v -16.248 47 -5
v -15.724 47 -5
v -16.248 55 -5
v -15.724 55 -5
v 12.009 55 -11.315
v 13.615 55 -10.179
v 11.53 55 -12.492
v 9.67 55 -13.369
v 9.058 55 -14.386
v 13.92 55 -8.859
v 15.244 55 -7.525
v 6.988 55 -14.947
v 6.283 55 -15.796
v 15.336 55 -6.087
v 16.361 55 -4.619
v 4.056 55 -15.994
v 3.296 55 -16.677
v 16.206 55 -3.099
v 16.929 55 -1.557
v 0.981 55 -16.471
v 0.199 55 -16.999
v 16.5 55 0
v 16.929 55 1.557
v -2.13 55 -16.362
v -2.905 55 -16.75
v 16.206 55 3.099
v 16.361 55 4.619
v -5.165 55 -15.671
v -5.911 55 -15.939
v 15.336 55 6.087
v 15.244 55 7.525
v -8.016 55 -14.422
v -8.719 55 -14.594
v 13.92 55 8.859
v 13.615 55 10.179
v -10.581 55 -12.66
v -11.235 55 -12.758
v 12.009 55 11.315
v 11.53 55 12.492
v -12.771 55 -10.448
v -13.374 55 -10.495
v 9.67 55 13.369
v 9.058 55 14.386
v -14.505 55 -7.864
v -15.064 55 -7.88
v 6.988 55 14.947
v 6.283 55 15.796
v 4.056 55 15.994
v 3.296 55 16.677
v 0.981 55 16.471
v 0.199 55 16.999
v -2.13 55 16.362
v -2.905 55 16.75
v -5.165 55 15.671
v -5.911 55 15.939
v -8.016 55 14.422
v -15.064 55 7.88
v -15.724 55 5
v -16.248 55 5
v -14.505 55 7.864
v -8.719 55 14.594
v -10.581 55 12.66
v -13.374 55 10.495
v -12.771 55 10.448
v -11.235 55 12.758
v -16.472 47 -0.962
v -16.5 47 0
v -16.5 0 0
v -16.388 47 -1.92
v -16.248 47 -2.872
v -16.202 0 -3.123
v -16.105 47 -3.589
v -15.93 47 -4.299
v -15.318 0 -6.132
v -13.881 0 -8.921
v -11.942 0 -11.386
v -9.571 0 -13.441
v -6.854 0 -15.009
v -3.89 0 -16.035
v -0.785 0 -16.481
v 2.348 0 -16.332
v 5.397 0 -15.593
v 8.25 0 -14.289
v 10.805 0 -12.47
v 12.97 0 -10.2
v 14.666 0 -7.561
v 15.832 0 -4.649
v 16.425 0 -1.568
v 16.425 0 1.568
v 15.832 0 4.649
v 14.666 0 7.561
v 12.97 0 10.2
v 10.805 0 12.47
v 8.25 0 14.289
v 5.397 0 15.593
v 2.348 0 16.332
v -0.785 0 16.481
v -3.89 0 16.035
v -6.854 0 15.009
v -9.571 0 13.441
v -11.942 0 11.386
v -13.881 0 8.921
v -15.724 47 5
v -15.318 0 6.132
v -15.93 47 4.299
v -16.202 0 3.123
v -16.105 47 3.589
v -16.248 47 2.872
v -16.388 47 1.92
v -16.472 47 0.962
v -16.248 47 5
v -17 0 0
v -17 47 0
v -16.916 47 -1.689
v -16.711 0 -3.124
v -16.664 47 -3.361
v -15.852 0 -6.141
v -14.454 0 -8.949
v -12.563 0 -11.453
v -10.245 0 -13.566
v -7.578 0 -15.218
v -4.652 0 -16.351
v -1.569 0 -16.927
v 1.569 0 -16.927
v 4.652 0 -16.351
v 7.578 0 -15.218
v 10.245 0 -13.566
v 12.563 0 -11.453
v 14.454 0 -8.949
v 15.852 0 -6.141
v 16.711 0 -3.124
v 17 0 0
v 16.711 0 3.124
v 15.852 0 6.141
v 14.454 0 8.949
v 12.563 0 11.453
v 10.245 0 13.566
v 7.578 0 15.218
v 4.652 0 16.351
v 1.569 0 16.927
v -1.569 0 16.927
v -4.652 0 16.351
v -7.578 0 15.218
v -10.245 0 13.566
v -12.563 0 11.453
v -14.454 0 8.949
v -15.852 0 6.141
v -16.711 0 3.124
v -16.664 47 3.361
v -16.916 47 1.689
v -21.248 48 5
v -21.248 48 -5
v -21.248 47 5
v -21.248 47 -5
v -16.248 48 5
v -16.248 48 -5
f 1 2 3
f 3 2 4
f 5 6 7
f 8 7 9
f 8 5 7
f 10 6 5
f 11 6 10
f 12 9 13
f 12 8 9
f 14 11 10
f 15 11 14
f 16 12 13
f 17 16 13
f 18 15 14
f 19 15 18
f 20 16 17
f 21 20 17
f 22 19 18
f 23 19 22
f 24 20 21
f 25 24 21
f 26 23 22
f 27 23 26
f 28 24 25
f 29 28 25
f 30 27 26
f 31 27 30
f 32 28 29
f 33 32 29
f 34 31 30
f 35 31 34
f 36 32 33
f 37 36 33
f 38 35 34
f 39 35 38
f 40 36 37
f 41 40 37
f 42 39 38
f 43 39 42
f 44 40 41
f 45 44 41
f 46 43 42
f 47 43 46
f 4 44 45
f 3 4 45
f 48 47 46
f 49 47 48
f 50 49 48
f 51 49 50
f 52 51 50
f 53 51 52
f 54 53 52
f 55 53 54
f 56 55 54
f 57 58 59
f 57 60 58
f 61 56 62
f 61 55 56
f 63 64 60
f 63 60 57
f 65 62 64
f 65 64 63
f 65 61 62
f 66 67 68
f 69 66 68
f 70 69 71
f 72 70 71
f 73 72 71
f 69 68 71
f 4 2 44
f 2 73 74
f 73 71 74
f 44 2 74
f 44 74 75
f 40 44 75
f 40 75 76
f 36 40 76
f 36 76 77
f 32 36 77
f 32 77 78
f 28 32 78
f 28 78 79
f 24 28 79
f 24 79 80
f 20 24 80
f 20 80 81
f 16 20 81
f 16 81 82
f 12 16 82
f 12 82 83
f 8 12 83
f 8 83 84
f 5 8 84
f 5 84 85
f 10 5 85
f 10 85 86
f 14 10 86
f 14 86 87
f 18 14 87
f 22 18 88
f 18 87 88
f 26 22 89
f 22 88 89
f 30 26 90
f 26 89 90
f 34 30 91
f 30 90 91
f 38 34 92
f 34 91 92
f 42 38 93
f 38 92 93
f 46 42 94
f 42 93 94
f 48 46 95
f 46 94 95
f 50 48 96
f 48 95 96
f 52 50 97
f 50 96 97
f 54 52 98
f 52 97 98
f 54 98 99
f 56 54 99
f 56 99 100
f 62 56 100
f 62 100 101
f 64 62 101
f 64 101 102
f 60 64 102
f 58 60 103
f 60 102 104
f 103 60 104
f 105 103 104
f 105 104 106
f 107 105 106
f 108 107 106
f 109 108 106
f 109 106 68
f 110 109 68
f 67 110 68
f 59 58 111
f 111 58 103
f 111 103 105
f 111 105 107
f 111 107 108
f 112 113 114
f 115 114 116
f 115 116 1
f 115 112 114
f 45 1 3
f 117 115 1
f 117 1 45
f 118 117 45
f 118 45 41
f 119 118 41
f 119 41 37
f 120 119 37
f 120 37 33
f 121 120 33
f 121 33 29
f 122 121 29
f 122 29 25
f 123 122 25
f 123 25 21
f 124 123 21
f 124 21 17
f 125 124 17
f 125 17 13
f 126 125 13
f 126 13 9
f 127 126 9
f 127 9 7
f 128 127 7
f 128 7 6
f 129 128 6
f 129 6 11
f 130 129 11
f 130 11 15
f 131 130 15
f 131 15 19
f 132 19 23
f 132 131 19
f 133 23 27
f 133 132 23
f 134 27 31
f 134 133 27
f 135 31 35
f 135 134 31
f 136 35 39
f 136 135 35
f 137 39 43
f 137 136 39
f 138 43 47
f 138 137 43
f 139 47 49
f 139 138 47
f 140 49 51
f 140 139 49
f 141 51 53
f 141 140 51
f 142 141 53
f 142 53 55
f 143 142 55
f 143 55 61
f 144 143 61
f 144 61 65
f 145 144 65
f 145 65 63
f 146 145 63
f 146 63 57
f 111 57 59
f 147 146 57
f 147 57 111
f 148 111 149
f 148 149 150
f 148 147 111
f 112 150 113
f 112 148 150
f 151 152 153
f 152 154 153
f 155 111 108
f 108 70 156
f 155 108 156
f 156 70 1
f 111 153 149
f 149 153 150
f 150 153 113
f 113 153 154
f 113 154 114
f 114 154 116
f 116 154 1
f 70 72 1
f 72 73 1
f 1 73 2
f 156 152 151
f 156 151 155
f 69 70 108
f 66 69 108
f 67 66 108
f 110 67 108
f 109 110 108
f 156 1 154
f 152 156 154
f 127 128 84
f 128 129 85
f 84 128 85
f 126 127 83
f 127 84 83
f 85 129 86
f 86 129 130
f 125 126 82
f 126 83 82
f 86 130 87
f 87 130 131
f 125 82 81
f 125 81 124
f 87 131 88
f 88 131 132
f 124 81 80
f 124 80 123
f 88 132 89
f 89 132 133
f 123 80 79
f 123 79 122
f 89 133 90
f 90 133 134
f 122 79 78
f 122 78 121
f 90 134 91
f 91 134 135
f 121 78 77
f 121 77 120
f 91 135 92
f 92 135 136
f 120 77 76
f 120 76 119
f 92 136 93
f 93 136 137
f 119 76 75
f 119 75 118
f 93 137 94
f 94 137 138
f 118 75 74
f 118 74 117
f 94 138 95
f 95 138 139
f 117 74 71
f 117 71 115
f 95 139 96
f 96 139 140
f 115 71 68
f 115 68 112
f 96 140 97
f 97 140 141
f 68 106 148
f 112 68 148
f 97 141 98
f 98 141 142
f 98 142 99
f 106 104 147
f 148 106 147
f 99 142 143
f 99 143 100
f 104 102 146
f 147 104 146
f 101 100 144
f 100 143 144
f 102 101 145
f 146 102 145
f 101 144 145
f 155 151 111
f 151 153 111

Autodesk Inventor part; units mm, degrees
ref_plane "YZ Plane" through (0, 0, 0) normal (1, 0, 0) x (0, 1, 0)
ref_plane "XZ Plane" through (0, 0, 0) normal (0, 1, 0) x (-1, 0, 0)
ref_plane "XY Plane" through (0, 0, 0) normal (0, 0, 1) x (1, 0, 0)
sketch "Boceto1" plane through (0, 0, 0) normal (0, 1, 0) x (-1, 0, 0)
  circle A0 centre (0, 0) radius 16.5
  circle A1 centre (0, 0) radius 17
  dimension "d0" = 33
  dimension "d1" = 34
extrude "Extrusión1" add sketch "Boceto1" along normal blind 55
sketch "Boceto2" plane through (0, 0, 0) normal (1, 0, 0) x (0, 1, 0)
  line L0 (55, 5) -> (47, 5)
  line L1 (47, 5) -> (47, -5)
  line L2 (47, -5) -> (55, -5)
  line L3 (55, -5) -> (55, 5)
  line L4 (55, 16.5) -> (55, -16.5) construction
  line L5 (0, 16.5) -> (0, -16.5) construction
  point P0 (0, 0)
  point P1 (55, 0)
  dimension "d4" = 10
  dimension "d5" = 8
extrude "Extrusión2" cut sketch "Boceto2" against normal blind 55
sketch "Boceto3" plane through (-16.2481, 47, 5) normal (0, 1, 0) x (1, 0, 0)
  arc A0 (0, 10) -> (0, 0) centre (16.2481, 5) ccw construction
  line L0 (0.5239, 0) -> (0, 0) construction
  arc A1 (0.5239, 10) -> (0.5239, 0) centre (16.2481, 5) ccw construction
  line L1 (0.5239, 10) -> (0, 10) construction
  line L2 (0, 10) -> (-5, 10)
  line L3 (-5, 10) -> (-5, 0)
  line L4 (-5, 0) -> (0, 0)
  line L5 (0, 0) -> (0, 10)
  dimension "d8" = 5
  dimension "d9" = 10
extrude "Extrusión3" add sketch "Boceto3" along normal blind 1
properties part number "tuvo"
